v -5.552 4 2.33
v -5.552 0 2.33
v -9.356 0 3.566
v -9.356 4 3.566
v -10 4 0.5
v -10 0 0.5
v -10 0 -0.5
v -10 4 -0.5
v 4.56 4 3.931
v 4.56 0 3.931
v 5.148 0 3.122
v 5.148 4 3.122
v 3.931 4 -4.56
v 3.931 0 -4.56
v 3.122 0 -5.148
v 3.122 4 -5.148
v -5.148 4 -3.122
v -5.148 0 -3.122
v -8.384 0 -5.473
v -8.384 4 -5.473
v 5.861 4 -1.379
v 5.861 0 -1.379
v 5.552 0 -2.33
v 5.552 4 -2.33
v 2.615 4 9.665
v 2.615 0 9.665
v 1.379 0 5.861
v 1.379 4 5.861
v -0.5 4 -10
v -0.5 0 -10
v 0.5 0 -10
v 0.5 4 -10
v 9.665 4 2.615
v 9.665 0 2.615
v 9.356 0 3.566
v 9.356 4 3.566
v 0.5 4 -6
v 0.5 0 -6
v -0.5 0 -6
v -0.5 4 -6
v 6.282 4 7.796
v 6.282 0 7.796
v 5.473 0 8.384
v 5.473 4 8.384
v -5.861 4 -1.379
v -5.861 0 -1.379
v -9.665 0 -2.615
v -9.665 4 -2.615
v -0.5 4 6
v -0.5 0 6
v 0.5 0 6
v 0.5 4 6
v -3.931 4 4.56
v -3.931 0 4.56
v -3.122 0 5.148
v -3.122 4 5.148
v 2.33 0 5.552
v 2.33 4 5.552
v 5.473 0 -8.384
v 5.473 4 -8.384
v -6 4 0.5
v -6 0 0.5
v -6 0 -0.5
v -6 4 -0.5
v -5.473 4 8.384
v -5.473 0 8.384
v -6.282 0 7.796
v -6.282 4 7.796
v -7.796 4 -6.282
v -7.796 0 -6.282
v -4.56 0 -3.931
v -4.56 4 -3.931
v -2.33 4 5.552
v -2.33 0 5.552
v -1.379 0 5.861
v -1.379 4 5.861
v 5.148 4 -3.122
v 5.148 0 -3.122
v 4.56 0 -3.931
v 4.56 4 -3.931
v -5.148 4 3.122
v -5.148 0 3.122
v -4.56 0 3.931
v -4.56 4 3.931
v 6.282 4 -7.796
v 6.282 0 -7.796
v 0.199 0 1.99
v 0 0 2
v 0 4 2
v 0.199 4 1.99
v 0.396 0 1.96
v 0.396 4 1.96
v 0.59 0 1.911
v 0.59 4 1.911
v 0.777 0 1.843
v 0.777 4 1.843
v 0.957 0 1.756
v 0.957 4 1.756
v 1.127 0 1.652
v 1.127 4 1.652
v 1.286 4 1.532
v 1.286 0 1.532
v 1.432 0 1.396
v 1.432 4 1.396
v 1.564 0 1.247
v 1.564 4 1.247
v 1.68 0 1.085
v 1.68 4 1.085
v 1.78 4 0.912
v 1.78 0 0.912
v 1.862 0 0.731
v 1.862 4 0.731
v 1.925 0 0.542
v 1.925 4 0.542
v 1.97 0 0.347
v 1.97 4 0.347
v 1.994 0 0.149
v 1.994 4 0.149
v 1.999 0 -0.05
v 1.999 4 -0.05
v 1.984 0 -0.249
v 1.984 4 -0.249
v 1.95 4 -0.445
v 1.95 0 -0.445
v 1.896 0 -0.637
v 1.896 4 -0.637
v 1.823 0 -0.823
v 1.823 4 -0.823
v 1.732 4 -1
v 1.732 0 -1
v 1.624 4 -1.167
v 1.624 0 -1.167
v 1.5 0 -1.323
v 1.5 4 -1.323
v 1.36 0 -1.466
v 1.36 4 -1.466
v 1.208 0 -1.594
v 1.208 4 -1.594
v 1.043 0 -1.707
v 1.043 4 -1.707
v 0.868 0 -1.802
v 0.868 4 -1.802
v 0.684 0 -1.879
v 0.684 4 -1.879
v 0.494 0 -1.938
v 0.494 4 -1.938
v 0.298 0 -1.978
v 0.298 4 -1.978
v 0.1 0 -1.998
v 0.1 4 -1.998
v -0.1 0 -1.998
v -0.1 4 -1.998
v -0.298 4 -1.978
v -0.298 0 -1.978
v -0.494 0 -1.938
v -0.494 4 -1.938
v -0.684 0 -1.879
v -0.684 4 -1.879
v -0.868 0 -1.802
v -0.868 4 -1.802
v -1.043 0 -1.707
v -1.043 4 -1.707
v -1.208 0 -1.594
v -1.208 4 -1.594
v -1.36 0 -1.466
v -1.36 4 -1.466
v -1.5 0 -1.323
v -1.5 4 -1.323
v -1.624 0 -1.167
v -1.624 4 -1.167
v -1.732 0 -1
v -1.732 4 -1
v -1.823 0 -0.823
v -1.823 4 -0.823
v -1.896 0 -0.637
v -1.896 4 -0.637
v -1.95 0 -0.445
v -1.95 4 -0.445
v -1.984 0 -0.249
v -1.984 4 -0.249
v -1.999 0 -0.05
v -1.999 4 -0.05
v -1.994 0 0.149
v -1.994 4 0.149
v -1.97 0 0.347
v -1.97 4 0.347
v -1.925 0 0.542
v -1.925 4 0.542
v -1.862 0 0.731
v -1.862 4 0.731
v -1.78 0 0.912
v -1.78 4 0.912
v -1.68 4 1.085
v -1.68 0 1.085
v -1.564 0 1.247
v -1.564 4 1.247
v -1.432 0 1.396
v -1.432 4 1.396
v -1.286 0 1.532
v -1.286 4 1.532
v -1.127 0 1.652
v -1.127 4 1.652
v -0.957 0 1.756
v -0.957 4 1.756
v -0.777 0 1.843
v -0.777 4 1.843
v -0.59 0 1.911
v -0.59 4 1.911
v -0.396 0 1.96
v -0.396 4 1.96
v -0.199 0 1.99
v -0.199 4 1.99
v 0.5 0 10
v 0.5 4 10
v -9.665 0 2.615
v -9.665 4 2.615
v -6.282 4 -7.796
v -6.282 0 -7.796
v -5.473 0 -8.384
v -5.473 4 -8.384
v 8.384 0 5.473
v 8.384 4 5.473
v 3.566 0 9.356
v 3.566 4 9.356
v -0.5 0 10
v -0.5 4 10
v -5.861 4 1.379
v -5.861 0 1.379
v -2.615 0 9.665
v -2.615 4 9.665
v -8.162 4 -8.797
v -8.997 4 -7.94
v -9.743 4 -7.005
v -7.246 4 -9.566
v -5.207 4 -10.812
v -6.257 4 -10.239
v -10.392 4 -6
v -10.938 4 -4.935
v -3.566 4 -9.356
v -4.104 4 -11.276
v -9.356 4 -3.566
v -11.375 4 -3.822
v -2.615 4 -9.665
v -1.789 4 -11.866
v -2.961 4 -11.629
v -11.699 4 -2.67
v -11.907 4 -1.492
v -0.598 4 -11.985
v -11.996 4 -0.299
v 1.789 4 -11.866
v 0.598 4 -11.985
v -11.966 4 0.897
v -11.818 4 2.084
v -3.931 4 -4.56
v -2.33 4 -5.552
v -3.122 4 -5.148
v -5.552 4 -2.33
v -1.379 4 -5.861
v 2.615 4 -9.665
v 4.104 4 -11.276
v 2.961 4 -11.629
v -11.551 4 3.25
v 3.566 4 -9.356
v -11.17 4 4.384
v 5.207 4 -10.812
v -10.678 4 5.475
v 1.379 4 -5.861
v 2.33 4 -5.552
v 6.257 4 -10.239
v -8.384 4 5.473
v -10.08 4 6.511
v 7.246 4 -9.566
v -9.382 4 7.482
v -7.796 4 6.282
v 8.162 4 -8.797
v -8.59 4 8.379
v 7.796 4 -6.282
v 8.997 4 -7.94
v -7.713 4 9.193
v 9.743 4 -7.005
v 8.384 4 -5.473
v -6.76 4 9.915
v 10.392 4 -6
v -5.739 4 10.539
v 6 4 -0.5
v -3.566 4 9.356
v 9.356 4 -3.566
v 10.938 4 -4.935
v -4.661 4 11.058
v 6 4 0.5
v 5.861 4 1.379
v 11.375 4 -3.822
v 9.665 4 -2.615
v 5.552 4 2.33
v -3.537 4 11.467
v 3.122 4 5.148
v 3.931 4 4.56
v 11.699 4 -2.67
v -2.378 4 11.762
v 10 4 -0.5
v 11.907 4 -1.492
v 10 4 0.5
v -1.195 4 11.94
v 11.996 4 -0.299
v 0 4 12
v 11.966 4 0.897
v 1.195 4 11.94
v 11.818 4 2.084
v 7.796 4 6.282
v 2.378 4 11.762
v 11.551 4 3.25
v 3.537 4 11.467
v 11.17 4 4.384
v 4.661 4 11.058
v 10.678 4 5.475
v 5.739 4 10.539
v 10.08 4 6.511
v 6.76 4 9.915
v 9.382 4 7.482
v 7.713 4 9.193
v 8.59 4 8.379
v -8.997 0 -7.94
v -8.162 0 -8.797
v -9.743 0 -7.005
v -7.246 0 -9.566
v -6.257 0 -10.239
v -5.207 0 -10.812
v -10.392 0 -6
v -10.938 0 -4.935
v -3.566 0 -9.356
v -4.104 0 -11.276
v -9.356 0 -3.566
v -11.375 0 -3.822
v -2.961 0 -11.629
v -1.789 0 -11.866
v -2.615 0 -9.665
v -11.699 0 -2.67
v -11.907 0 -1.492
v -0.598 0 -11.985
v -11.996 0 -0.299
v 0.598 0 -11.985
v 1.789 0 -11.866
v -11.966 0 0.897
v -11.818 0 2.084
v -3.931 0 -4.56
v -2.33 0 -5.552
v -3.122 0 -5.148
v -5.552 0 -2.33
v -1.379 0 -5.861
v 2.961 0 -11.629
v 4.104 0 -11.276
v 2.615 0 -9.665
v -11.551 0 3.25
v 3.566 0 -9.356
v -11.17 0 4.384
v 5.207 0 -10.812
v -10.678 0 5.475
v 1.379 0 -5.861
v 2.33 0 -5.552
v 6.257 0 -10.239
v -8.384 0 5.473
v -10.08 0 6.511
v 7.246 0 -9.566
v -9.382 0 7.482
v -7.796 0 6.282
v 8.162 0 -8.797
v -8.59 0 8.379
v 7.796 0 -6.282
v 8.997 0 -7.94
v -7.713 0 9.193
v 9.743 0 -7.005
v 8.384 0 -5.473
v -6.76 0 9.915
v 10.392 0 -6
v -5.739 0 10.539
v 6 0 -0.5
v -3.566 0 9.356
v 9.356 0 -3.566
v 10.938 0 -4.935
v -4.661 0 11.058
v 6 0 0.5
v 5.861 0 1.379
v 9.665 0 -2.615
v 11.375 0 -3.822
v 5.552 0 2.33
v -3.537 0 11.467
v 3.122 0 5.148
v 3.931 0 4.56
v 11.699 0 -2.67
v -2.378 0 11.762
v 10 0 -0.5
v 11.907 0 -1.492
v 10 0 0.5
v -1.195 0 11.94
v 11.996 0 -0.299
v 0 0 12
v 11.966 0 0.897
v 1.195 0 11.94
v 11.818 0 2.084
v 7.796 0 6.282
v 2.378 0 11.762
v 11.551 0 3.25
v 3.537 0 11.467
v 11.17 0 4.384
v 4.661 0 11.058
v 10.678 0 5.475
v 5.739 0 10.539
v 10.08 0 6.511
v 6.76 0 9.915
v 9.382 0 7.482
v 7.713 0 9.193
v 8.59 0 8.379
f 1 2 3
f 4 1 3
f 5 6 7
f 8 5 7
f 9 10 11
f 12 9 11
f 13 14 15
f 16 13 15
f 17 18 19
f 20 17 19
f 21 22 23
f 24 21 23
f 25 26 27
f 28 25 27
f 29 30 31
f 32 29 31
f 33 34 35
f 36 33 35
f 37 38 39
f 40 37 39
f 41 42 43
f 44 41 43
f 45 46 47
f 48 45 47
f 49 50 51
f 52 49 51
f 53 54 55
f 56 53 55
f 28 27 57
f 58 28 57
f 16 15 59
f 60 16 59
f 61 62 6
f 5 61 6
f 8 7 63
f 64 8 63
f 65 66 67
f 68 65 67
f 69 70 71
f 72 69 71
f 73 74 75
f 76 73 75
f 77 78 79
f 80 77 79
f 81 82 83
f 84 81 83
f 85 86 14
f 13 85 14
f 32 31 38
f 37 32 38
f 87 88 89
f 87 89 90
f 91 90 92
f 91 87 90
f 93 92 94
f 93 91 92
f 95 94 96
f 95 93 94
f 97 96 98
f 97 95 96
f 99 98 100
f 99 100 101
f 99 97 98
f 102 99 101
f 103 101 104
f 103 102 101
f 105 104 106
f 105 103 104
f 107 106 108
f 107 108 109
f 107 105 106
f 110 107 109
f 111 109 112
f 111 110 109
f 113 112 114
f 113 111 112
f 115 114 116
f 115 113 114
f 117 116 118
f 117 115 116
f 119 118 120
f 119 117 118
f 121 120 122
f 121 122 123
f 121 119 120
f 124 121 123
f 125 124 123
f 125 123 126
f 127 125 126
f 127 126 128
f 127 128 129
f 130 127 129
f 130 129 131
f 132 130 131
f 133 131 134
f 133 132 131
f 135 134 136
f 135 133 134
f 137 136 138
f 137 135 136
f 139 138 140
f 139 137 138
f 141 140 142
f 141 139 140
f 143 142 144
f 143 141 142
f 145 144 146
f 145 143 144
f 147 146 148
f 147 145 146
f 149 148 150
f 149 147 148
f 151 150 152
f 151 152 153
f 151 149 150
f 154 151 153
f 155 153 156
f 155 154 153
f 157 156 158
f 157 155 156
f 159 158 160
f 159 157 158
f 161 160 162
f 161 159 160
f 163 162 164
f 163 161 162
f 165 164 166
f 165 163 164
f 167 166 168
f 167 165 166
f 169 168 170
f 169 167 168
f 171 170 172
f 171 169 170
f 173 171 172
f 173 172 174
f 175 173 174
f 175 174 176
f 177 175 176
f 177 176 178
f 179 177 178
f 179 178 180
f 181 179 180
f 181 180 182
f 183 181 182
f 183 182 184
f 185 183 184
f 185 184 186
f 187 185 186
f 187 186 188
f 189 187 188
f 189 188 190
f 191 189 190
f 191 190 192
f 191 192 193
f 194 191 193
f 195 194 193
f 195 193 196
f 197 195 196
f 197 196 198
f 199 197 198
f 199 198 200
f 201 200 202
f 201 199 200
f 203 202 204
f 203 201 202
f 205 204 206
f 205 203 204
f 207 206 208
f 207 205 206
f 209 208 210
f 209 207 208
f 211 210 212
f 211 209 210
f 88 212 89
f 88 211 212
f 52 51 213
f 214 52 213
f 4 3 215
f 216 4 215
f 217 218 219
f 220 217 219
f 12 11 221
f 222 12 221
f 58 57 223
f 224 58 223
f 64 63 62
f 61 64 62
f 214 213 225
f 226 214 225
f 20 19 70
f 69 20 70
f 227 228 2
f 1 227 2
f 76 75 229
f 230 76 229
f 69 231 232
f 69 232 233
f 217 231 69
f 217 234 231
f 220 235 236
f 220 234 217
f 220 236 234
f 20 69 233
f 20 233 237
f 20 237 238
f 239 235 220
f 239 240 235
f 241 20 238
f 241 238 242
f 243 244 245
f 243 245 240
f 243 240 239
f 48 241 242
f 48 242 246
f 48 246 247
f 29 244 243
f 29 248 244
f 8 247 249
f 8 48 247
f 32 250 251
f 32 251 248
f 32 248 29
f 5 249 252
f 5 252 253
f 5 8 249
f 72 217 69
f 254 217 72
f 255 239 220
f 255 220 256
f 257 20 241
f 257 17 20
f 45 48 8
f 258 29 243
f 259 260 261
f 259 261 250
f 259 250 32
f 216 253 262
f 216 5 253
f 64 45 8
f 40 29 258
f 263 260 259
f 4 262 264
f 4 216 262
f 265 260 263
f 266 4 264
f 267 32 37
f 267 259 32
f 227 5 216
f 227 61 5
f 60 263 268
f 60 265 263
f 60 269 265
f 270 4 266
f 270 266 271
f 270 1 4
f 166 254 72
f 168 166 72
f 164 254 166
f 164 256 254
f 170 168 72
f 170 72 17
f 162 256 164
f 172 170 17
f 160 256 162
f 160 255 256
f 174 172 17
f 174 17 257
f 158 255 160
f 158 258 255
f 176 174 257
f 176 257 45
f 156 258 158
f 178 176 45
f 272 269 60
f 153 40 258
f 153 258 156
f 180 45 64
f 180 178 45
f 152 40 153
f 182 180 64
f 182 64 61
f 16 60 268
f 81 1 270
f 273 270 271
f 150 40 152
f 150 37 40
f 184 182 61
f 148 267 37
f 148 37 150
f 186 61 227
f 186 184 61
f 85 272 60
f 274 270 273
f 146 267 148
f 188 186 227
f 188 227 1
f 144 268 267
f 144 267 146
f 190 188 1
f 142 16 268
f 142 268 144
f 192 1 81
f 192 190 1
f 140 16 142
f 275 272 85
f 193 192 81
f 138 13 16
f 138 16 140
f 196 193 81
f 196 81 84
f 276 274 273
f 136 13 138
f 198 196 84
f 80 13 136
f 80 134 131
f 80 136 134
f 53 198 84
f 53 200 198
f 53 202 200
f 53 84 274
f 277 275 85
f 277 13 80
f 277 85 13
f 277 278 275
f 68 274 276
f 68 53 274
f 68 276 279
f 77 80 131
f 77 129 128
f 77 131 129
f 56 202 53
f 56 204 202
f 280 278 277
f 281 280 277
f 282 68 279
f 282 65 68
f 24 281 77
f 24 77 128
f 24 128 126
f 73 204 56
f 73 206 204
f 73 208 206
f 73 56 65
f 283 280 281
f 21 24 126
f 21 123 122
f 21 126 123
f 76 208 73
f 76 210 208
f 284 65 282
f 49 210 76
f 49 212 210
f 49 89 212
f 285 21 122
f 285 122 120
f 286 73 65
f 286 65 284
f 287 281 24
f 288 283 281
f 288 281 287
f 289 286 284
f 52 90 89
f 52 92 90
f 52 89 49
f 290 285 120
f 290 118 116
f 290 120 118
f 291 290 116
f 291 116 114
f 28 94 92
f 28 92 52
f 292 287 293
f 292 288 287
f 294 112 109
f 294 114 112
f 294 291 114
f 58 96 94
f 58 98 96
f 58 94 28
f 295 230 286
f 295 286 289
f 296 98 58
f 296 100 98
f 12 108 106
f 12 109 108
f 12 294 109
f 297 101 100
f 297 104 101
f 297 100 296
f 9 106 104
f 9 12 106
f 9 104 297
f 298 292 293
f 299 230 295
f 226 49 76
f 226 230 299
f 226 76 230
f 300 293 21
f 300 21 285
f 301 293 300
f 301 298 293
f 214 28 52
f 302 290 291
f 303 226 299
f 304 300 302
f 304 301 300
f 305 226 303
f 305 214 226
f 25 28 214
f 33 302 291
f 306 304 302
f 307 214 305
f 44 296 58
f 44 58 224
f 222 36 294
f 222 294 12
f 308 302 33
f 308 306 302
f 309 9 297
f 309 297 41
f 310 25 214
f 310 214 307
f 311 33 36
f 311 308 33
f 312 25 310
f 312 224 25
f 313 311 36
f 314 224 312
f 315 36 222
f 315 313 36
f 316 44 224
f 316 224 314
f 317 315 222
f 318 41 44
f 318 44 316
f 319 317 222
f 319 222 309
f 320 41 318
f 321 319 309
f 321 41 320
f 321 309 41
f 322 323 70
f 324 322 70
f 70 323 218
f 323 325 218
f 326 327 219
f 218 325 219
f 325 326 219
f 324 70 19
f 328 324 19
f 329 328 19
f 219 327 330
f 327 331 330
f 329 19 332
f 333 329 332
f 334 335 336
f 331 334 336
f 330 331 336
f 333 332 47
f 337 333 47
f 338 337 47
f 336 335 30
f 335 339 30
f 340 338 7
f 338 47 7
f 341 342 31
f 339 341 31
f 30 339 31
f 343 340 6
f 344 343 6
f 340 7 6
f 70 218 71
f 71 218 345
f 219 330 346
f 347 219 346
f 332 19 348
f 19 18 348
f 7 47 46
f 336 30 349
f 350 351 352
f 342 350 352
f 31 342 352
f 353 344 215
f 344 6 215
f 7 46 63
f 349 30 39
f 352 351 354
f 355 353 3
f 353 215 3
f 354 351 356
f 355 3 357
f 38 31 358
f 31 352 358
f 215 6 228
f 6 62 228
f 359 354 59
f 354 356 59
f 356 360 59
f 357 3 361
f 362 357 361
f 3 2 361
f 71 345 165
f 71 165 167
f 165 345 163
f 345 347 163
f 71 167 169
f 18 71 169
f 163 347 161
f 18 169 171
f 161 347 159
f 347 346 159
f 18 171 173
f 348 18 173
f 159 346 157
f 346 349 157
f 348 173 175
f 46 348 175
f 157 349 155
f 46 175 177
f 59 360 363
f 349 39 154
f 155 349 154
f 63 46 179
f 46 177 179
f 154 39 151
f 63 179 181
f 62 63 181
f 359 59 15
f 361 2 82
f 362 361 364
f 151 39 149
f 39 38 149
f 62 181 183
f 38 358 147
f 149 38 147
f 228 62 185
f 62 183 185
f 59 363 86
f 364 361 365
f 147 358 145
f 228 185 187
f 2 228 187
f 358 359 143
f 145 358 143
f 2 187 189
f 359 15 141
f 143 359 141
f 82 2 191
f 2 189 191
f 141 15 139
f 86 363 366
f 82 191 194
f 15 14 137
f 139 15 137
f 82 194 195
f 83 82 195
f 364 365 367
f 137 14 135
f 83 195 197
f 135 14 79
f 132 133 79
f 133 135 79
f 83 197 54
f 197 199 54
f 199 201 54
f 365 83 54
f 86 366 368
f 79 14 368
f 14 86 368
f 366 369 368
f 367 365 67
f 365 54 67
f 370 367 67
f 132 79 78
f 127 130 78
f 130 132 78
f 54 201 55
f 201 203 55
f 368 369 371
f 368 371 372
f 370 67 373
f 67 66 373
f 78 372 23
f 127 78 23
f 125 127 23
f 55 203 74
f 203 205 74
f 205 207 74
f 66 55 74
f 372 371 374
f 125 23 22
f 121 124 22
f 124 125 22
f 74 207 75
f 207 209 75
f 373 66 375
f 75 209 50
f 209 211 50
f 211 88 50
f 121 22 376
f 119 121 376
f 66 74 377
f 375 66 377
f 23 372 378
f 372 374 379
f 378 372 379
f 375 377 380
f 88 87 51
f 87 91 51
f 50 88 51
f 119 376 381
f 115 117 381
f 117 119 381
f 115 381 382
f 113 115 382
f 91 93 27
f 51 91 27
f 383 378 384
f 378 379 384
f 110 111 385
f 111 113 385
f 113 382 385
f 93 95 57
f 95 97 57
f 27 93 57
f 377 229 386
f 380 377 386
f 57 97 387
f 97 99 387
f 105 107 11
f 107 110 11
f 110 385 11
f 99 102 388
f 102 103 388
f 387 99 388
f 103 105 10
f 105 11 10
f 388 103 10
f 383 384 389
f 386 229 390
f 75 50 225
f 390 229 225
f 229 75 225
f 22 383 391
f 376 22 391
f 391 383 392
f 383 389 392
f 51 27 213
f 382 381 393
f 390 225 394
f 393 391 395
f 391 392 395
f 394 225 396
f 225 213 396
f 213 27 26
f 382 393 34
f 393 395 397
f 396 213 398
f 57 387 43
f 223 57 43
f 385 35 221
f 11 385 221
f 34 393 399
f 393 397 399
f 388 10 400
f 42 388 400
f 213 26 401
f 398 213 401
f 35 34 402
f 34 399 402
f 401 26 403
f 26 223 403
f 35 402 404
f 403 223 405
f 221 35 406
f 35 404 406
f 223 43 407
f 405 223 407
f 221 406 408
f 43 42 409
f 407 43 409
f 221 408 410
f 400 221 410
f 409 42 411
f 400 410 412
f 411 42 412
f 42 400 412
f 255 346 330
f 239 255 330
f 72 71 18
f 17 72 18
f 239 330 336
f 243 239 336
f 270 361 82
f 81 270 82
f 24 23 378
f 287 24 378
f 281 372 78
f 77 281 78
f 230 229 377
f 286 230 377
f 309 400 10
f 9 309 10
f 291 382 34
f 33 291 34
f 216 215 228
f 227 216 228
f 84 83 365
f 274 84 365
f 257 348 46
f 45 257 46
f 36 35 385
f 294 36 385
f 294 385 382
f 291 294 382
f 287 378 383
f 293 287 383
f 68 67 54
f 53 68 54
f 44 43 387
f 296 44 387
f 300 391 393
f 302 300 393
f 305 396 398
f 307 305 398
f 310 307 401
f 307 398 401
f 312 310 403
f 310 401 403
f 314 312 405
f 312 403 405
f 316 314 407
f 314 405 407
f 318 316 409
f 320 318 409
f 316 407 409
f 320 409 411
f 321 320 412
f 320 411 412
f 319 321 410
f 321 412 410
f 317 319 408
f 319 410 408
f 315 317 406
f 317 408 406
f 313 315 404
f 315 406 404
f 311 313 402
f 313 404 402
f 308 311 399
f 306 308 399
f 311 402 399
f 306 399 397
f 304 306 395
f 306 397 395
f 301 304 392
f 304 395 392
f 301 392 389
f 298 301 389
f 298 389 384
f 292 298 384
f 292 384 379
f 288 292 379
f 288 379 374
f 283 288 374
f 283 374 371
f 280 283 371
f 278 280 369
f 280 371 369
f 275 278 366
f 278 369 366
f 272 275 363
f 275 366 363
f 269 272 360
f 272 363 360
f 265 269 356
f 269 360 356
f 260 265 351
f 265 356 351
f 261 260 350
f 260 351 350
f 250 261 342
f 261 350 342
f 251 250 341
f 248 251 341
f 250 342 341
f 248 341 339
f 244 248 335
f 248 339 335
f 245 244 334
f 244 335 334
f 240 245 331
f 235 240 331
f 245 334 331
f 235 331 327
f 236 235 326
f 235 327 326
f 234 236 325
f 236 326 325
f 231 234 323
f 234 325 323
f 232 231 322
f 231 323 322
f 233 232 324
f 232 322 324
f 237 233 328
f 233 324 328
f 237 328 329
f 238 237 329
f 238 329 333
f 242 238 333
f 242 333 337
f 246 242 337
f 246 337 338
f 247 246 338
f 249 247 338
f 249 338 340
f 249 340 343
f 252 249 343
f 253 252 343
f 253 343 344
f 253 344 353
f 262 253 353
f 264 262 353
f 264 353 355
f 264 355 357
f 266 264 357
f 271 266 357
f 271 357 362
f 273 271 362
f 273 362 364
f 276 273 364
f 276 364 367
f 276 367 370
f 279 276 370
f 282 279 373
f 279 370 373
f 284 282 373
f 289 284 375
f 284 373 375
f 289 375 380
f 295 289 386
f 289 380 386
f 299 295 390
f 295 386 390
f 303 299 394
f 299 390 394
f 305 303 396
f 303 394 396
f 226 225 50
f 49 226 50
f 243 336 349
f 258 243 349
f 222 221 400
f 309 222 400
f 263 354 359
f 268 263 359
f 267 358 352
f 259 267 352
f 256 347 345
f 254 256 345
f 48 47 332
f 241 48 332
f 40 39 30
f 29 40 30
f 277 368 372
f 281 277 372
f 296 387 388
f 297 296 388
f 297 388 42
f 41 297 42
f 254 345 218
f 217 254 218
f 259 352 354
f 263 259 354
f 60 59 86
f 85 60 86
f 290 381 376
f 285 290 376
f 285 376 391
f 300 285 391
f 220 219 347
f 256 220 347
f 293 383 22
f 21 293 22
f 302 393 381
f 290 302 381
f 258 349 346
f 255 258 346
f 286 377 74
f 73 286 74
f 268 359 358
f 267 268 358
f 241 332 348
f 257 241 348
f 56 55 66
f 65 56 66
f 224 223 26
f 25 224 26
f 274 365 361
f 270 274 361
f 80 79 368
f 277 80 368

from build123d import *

# Parameters (mm, degrees)
SKETCH1_R           = 12
SKETCH1_R_2         = 2
BOSS_EXTRUDE1_DEPTH = 4


with BuildPart() as part:
    # Sketch1 → Boss-Extrude1 (new body)
    with BuildSketch(Plane(origin=(0, 0, 0), x_dir=(1, 0, 0), z_dir=(0, 1, 0))):
        with Locations(Location((0, 0, 0), (0, 0, 270))):
            Circle(SKETCH1_R)
        Polygon((-5.473344026, -8.38406257), (-5.877852523, -8.090169944), (-6.28236102, -7.796277318), (-3.931220011, -4.56020934), (-3.122203017, -5.147994592), align=None, mode=Mode.SUBTRACT)
        Polygon((-2.614641686, -9.66507366), (-3.090169944, -9.510565163), (-3.565698202, -9.356056666), (-2.329630224, -5.551830601), (-1.378573708, -5.860847595), align=None, mode=Mode.SUBTRACT)
        Polygon((-7.796277318, -6.28236102), (-8.090169944, -5.877852523), (-8.38406257, -5.473344026), (-5.147994592, -3.122203017), (-4.56020934, -3.931220011), align=None, mode=Mode.SUBTRACT)
        Polygon((-9.356056666, -3.565698202), (-9.510565163, -3.090169944), (-9.66507366, -2.614641686), (-5.860847595, -1.378573708), (-5.551830601, -2.329630224), align=None, mode=Mode.SUBTRACT)
        Polygon((0.5, -10), (0, -10), (-0.5, -10), (-0.5, -6), (0.5, -6), align=None, mode=Mode.SUBTRACT)
        Polygon((3.565698202, -9.356056666), (3.090169944, -9.510565163), (2.614641686, -9.66507366), (1.378573708, -5.860847595), (2.329630224, -5.551830601), align=None, mode=Mode.SUBTRACT)
        Polygon((6.28236102, -7.796277318), (5.877852523, -8.090169944), (5.473344026, -8.38406257), (3.122203017, -5.147994592), (3.931220011, -4.56020934), align=None, mode=Mode.SUBTRACT)
        Polygon((8.38406257, -5.473344026), (8.090169944, -5.877852523), (7.796277318, -6.28236102), (4.56020934, -3.931220011), (5.147994592, -3.122203017), align=None, mode=Mode.SUBTRACT)
        Polygon((9.66507366, -2.614641686), (9.510565163, -3.090169944), (9.356056666, -3.565698202), (5.551830601, -2.329630224), (5.860847595, -1.378573708), align=None, mode=Mode.SUBTRACT)
        Polygon((10, 0.5), (10, 0), (10, -0.5), (6, -0.5), (6, 0.5), align=None, mode=Mode.SUBTRACT)
        Polygon((-10, -0.5), (-10, 0), (-10, 0.5), (-6, 0.5), (-6, -0.5), align=None, mode=Mode.SUBTRACT)
        Polygon((-9.66507366, 2.614641686), (-9.510565163, 3.090169944), (-9.356056666, 3.565698202), (-5.551830601, 2.329630224), (-5.860847595, 1.378573708), align=None, mode=Mode.SUBTRACT)
        Polygon((-8.38406257, 5.473344026), (-8.090169944, 5.877852523), (-7.796277318, 6.28236102), (-4.56020934, 3.931220011), (-5.147994592, 3.122203017), align=None, mode=Mode.SUBTRACT)
        Polygon((-6.28236102, 7.796277318), (-5.877852523, 8.090169944), (-5.473344026, 8.38406257), (-3.122203017, 5.147994592), (-3.931220011, 4.56020934), align=None, mode=Mode.SUBTRACT)
        Polygon((-3.565698202, 9.356056666), (-3.090169944, 9.510565163), (-2.614641686, 9.66507366), (-1.378573708, 5.860847595), (-2.329630224, 5.551830601), align=None, mode=Mode.SUBTRACT)
        with Locations(Location((0, 0, 0), (0, 0, 270))):
            Circle(SKETCH1_R_2, mode=Mode.SUBTRACT)
        Polygon((9.356056666, 3.565698202), (9.510565163, 3.090169944), (9.66507366, 2.614641686), (5.860847595, 1.378573708), (5.551830601, 2.329630224), align=None, mode=Mode.SUBTRACT)
        Polygon((7.796277318, 6.28236102), (8.090169944, 5.877852523), (8.38406257, 5.473344026), (5.147994592, 3.122203017), (4.56020934, 3.931220011), align=None, mode=Mode.SUBTRACT)
        Polygon((-0.5, 10), (0, 10), (0.5, 10), (0.5, 6), (-0.5, 6), align=None, mode=Mode.SUBTRACT)
        Polygon((2.614641686, 9.66507366), (3.090169944, 9.510565163), (3.565698202, 9.356056666), (2.329630224, 5.551830601), (1.378573708, 5.860847595), align=None, mode=Mode.SUBTRACT)
        Polygon((5.473344026, 8.38406257), (5.877852523, 8.090169944), (6.28236102, 7.796277318), (3.931220011, 4.56020934), (3.122203017, 5.147994592), align=None, mode=Mode.SUBTRACT)
    extrude(amount=BOSS_EXTRUDE1_DEPTH)


solid = part.part
